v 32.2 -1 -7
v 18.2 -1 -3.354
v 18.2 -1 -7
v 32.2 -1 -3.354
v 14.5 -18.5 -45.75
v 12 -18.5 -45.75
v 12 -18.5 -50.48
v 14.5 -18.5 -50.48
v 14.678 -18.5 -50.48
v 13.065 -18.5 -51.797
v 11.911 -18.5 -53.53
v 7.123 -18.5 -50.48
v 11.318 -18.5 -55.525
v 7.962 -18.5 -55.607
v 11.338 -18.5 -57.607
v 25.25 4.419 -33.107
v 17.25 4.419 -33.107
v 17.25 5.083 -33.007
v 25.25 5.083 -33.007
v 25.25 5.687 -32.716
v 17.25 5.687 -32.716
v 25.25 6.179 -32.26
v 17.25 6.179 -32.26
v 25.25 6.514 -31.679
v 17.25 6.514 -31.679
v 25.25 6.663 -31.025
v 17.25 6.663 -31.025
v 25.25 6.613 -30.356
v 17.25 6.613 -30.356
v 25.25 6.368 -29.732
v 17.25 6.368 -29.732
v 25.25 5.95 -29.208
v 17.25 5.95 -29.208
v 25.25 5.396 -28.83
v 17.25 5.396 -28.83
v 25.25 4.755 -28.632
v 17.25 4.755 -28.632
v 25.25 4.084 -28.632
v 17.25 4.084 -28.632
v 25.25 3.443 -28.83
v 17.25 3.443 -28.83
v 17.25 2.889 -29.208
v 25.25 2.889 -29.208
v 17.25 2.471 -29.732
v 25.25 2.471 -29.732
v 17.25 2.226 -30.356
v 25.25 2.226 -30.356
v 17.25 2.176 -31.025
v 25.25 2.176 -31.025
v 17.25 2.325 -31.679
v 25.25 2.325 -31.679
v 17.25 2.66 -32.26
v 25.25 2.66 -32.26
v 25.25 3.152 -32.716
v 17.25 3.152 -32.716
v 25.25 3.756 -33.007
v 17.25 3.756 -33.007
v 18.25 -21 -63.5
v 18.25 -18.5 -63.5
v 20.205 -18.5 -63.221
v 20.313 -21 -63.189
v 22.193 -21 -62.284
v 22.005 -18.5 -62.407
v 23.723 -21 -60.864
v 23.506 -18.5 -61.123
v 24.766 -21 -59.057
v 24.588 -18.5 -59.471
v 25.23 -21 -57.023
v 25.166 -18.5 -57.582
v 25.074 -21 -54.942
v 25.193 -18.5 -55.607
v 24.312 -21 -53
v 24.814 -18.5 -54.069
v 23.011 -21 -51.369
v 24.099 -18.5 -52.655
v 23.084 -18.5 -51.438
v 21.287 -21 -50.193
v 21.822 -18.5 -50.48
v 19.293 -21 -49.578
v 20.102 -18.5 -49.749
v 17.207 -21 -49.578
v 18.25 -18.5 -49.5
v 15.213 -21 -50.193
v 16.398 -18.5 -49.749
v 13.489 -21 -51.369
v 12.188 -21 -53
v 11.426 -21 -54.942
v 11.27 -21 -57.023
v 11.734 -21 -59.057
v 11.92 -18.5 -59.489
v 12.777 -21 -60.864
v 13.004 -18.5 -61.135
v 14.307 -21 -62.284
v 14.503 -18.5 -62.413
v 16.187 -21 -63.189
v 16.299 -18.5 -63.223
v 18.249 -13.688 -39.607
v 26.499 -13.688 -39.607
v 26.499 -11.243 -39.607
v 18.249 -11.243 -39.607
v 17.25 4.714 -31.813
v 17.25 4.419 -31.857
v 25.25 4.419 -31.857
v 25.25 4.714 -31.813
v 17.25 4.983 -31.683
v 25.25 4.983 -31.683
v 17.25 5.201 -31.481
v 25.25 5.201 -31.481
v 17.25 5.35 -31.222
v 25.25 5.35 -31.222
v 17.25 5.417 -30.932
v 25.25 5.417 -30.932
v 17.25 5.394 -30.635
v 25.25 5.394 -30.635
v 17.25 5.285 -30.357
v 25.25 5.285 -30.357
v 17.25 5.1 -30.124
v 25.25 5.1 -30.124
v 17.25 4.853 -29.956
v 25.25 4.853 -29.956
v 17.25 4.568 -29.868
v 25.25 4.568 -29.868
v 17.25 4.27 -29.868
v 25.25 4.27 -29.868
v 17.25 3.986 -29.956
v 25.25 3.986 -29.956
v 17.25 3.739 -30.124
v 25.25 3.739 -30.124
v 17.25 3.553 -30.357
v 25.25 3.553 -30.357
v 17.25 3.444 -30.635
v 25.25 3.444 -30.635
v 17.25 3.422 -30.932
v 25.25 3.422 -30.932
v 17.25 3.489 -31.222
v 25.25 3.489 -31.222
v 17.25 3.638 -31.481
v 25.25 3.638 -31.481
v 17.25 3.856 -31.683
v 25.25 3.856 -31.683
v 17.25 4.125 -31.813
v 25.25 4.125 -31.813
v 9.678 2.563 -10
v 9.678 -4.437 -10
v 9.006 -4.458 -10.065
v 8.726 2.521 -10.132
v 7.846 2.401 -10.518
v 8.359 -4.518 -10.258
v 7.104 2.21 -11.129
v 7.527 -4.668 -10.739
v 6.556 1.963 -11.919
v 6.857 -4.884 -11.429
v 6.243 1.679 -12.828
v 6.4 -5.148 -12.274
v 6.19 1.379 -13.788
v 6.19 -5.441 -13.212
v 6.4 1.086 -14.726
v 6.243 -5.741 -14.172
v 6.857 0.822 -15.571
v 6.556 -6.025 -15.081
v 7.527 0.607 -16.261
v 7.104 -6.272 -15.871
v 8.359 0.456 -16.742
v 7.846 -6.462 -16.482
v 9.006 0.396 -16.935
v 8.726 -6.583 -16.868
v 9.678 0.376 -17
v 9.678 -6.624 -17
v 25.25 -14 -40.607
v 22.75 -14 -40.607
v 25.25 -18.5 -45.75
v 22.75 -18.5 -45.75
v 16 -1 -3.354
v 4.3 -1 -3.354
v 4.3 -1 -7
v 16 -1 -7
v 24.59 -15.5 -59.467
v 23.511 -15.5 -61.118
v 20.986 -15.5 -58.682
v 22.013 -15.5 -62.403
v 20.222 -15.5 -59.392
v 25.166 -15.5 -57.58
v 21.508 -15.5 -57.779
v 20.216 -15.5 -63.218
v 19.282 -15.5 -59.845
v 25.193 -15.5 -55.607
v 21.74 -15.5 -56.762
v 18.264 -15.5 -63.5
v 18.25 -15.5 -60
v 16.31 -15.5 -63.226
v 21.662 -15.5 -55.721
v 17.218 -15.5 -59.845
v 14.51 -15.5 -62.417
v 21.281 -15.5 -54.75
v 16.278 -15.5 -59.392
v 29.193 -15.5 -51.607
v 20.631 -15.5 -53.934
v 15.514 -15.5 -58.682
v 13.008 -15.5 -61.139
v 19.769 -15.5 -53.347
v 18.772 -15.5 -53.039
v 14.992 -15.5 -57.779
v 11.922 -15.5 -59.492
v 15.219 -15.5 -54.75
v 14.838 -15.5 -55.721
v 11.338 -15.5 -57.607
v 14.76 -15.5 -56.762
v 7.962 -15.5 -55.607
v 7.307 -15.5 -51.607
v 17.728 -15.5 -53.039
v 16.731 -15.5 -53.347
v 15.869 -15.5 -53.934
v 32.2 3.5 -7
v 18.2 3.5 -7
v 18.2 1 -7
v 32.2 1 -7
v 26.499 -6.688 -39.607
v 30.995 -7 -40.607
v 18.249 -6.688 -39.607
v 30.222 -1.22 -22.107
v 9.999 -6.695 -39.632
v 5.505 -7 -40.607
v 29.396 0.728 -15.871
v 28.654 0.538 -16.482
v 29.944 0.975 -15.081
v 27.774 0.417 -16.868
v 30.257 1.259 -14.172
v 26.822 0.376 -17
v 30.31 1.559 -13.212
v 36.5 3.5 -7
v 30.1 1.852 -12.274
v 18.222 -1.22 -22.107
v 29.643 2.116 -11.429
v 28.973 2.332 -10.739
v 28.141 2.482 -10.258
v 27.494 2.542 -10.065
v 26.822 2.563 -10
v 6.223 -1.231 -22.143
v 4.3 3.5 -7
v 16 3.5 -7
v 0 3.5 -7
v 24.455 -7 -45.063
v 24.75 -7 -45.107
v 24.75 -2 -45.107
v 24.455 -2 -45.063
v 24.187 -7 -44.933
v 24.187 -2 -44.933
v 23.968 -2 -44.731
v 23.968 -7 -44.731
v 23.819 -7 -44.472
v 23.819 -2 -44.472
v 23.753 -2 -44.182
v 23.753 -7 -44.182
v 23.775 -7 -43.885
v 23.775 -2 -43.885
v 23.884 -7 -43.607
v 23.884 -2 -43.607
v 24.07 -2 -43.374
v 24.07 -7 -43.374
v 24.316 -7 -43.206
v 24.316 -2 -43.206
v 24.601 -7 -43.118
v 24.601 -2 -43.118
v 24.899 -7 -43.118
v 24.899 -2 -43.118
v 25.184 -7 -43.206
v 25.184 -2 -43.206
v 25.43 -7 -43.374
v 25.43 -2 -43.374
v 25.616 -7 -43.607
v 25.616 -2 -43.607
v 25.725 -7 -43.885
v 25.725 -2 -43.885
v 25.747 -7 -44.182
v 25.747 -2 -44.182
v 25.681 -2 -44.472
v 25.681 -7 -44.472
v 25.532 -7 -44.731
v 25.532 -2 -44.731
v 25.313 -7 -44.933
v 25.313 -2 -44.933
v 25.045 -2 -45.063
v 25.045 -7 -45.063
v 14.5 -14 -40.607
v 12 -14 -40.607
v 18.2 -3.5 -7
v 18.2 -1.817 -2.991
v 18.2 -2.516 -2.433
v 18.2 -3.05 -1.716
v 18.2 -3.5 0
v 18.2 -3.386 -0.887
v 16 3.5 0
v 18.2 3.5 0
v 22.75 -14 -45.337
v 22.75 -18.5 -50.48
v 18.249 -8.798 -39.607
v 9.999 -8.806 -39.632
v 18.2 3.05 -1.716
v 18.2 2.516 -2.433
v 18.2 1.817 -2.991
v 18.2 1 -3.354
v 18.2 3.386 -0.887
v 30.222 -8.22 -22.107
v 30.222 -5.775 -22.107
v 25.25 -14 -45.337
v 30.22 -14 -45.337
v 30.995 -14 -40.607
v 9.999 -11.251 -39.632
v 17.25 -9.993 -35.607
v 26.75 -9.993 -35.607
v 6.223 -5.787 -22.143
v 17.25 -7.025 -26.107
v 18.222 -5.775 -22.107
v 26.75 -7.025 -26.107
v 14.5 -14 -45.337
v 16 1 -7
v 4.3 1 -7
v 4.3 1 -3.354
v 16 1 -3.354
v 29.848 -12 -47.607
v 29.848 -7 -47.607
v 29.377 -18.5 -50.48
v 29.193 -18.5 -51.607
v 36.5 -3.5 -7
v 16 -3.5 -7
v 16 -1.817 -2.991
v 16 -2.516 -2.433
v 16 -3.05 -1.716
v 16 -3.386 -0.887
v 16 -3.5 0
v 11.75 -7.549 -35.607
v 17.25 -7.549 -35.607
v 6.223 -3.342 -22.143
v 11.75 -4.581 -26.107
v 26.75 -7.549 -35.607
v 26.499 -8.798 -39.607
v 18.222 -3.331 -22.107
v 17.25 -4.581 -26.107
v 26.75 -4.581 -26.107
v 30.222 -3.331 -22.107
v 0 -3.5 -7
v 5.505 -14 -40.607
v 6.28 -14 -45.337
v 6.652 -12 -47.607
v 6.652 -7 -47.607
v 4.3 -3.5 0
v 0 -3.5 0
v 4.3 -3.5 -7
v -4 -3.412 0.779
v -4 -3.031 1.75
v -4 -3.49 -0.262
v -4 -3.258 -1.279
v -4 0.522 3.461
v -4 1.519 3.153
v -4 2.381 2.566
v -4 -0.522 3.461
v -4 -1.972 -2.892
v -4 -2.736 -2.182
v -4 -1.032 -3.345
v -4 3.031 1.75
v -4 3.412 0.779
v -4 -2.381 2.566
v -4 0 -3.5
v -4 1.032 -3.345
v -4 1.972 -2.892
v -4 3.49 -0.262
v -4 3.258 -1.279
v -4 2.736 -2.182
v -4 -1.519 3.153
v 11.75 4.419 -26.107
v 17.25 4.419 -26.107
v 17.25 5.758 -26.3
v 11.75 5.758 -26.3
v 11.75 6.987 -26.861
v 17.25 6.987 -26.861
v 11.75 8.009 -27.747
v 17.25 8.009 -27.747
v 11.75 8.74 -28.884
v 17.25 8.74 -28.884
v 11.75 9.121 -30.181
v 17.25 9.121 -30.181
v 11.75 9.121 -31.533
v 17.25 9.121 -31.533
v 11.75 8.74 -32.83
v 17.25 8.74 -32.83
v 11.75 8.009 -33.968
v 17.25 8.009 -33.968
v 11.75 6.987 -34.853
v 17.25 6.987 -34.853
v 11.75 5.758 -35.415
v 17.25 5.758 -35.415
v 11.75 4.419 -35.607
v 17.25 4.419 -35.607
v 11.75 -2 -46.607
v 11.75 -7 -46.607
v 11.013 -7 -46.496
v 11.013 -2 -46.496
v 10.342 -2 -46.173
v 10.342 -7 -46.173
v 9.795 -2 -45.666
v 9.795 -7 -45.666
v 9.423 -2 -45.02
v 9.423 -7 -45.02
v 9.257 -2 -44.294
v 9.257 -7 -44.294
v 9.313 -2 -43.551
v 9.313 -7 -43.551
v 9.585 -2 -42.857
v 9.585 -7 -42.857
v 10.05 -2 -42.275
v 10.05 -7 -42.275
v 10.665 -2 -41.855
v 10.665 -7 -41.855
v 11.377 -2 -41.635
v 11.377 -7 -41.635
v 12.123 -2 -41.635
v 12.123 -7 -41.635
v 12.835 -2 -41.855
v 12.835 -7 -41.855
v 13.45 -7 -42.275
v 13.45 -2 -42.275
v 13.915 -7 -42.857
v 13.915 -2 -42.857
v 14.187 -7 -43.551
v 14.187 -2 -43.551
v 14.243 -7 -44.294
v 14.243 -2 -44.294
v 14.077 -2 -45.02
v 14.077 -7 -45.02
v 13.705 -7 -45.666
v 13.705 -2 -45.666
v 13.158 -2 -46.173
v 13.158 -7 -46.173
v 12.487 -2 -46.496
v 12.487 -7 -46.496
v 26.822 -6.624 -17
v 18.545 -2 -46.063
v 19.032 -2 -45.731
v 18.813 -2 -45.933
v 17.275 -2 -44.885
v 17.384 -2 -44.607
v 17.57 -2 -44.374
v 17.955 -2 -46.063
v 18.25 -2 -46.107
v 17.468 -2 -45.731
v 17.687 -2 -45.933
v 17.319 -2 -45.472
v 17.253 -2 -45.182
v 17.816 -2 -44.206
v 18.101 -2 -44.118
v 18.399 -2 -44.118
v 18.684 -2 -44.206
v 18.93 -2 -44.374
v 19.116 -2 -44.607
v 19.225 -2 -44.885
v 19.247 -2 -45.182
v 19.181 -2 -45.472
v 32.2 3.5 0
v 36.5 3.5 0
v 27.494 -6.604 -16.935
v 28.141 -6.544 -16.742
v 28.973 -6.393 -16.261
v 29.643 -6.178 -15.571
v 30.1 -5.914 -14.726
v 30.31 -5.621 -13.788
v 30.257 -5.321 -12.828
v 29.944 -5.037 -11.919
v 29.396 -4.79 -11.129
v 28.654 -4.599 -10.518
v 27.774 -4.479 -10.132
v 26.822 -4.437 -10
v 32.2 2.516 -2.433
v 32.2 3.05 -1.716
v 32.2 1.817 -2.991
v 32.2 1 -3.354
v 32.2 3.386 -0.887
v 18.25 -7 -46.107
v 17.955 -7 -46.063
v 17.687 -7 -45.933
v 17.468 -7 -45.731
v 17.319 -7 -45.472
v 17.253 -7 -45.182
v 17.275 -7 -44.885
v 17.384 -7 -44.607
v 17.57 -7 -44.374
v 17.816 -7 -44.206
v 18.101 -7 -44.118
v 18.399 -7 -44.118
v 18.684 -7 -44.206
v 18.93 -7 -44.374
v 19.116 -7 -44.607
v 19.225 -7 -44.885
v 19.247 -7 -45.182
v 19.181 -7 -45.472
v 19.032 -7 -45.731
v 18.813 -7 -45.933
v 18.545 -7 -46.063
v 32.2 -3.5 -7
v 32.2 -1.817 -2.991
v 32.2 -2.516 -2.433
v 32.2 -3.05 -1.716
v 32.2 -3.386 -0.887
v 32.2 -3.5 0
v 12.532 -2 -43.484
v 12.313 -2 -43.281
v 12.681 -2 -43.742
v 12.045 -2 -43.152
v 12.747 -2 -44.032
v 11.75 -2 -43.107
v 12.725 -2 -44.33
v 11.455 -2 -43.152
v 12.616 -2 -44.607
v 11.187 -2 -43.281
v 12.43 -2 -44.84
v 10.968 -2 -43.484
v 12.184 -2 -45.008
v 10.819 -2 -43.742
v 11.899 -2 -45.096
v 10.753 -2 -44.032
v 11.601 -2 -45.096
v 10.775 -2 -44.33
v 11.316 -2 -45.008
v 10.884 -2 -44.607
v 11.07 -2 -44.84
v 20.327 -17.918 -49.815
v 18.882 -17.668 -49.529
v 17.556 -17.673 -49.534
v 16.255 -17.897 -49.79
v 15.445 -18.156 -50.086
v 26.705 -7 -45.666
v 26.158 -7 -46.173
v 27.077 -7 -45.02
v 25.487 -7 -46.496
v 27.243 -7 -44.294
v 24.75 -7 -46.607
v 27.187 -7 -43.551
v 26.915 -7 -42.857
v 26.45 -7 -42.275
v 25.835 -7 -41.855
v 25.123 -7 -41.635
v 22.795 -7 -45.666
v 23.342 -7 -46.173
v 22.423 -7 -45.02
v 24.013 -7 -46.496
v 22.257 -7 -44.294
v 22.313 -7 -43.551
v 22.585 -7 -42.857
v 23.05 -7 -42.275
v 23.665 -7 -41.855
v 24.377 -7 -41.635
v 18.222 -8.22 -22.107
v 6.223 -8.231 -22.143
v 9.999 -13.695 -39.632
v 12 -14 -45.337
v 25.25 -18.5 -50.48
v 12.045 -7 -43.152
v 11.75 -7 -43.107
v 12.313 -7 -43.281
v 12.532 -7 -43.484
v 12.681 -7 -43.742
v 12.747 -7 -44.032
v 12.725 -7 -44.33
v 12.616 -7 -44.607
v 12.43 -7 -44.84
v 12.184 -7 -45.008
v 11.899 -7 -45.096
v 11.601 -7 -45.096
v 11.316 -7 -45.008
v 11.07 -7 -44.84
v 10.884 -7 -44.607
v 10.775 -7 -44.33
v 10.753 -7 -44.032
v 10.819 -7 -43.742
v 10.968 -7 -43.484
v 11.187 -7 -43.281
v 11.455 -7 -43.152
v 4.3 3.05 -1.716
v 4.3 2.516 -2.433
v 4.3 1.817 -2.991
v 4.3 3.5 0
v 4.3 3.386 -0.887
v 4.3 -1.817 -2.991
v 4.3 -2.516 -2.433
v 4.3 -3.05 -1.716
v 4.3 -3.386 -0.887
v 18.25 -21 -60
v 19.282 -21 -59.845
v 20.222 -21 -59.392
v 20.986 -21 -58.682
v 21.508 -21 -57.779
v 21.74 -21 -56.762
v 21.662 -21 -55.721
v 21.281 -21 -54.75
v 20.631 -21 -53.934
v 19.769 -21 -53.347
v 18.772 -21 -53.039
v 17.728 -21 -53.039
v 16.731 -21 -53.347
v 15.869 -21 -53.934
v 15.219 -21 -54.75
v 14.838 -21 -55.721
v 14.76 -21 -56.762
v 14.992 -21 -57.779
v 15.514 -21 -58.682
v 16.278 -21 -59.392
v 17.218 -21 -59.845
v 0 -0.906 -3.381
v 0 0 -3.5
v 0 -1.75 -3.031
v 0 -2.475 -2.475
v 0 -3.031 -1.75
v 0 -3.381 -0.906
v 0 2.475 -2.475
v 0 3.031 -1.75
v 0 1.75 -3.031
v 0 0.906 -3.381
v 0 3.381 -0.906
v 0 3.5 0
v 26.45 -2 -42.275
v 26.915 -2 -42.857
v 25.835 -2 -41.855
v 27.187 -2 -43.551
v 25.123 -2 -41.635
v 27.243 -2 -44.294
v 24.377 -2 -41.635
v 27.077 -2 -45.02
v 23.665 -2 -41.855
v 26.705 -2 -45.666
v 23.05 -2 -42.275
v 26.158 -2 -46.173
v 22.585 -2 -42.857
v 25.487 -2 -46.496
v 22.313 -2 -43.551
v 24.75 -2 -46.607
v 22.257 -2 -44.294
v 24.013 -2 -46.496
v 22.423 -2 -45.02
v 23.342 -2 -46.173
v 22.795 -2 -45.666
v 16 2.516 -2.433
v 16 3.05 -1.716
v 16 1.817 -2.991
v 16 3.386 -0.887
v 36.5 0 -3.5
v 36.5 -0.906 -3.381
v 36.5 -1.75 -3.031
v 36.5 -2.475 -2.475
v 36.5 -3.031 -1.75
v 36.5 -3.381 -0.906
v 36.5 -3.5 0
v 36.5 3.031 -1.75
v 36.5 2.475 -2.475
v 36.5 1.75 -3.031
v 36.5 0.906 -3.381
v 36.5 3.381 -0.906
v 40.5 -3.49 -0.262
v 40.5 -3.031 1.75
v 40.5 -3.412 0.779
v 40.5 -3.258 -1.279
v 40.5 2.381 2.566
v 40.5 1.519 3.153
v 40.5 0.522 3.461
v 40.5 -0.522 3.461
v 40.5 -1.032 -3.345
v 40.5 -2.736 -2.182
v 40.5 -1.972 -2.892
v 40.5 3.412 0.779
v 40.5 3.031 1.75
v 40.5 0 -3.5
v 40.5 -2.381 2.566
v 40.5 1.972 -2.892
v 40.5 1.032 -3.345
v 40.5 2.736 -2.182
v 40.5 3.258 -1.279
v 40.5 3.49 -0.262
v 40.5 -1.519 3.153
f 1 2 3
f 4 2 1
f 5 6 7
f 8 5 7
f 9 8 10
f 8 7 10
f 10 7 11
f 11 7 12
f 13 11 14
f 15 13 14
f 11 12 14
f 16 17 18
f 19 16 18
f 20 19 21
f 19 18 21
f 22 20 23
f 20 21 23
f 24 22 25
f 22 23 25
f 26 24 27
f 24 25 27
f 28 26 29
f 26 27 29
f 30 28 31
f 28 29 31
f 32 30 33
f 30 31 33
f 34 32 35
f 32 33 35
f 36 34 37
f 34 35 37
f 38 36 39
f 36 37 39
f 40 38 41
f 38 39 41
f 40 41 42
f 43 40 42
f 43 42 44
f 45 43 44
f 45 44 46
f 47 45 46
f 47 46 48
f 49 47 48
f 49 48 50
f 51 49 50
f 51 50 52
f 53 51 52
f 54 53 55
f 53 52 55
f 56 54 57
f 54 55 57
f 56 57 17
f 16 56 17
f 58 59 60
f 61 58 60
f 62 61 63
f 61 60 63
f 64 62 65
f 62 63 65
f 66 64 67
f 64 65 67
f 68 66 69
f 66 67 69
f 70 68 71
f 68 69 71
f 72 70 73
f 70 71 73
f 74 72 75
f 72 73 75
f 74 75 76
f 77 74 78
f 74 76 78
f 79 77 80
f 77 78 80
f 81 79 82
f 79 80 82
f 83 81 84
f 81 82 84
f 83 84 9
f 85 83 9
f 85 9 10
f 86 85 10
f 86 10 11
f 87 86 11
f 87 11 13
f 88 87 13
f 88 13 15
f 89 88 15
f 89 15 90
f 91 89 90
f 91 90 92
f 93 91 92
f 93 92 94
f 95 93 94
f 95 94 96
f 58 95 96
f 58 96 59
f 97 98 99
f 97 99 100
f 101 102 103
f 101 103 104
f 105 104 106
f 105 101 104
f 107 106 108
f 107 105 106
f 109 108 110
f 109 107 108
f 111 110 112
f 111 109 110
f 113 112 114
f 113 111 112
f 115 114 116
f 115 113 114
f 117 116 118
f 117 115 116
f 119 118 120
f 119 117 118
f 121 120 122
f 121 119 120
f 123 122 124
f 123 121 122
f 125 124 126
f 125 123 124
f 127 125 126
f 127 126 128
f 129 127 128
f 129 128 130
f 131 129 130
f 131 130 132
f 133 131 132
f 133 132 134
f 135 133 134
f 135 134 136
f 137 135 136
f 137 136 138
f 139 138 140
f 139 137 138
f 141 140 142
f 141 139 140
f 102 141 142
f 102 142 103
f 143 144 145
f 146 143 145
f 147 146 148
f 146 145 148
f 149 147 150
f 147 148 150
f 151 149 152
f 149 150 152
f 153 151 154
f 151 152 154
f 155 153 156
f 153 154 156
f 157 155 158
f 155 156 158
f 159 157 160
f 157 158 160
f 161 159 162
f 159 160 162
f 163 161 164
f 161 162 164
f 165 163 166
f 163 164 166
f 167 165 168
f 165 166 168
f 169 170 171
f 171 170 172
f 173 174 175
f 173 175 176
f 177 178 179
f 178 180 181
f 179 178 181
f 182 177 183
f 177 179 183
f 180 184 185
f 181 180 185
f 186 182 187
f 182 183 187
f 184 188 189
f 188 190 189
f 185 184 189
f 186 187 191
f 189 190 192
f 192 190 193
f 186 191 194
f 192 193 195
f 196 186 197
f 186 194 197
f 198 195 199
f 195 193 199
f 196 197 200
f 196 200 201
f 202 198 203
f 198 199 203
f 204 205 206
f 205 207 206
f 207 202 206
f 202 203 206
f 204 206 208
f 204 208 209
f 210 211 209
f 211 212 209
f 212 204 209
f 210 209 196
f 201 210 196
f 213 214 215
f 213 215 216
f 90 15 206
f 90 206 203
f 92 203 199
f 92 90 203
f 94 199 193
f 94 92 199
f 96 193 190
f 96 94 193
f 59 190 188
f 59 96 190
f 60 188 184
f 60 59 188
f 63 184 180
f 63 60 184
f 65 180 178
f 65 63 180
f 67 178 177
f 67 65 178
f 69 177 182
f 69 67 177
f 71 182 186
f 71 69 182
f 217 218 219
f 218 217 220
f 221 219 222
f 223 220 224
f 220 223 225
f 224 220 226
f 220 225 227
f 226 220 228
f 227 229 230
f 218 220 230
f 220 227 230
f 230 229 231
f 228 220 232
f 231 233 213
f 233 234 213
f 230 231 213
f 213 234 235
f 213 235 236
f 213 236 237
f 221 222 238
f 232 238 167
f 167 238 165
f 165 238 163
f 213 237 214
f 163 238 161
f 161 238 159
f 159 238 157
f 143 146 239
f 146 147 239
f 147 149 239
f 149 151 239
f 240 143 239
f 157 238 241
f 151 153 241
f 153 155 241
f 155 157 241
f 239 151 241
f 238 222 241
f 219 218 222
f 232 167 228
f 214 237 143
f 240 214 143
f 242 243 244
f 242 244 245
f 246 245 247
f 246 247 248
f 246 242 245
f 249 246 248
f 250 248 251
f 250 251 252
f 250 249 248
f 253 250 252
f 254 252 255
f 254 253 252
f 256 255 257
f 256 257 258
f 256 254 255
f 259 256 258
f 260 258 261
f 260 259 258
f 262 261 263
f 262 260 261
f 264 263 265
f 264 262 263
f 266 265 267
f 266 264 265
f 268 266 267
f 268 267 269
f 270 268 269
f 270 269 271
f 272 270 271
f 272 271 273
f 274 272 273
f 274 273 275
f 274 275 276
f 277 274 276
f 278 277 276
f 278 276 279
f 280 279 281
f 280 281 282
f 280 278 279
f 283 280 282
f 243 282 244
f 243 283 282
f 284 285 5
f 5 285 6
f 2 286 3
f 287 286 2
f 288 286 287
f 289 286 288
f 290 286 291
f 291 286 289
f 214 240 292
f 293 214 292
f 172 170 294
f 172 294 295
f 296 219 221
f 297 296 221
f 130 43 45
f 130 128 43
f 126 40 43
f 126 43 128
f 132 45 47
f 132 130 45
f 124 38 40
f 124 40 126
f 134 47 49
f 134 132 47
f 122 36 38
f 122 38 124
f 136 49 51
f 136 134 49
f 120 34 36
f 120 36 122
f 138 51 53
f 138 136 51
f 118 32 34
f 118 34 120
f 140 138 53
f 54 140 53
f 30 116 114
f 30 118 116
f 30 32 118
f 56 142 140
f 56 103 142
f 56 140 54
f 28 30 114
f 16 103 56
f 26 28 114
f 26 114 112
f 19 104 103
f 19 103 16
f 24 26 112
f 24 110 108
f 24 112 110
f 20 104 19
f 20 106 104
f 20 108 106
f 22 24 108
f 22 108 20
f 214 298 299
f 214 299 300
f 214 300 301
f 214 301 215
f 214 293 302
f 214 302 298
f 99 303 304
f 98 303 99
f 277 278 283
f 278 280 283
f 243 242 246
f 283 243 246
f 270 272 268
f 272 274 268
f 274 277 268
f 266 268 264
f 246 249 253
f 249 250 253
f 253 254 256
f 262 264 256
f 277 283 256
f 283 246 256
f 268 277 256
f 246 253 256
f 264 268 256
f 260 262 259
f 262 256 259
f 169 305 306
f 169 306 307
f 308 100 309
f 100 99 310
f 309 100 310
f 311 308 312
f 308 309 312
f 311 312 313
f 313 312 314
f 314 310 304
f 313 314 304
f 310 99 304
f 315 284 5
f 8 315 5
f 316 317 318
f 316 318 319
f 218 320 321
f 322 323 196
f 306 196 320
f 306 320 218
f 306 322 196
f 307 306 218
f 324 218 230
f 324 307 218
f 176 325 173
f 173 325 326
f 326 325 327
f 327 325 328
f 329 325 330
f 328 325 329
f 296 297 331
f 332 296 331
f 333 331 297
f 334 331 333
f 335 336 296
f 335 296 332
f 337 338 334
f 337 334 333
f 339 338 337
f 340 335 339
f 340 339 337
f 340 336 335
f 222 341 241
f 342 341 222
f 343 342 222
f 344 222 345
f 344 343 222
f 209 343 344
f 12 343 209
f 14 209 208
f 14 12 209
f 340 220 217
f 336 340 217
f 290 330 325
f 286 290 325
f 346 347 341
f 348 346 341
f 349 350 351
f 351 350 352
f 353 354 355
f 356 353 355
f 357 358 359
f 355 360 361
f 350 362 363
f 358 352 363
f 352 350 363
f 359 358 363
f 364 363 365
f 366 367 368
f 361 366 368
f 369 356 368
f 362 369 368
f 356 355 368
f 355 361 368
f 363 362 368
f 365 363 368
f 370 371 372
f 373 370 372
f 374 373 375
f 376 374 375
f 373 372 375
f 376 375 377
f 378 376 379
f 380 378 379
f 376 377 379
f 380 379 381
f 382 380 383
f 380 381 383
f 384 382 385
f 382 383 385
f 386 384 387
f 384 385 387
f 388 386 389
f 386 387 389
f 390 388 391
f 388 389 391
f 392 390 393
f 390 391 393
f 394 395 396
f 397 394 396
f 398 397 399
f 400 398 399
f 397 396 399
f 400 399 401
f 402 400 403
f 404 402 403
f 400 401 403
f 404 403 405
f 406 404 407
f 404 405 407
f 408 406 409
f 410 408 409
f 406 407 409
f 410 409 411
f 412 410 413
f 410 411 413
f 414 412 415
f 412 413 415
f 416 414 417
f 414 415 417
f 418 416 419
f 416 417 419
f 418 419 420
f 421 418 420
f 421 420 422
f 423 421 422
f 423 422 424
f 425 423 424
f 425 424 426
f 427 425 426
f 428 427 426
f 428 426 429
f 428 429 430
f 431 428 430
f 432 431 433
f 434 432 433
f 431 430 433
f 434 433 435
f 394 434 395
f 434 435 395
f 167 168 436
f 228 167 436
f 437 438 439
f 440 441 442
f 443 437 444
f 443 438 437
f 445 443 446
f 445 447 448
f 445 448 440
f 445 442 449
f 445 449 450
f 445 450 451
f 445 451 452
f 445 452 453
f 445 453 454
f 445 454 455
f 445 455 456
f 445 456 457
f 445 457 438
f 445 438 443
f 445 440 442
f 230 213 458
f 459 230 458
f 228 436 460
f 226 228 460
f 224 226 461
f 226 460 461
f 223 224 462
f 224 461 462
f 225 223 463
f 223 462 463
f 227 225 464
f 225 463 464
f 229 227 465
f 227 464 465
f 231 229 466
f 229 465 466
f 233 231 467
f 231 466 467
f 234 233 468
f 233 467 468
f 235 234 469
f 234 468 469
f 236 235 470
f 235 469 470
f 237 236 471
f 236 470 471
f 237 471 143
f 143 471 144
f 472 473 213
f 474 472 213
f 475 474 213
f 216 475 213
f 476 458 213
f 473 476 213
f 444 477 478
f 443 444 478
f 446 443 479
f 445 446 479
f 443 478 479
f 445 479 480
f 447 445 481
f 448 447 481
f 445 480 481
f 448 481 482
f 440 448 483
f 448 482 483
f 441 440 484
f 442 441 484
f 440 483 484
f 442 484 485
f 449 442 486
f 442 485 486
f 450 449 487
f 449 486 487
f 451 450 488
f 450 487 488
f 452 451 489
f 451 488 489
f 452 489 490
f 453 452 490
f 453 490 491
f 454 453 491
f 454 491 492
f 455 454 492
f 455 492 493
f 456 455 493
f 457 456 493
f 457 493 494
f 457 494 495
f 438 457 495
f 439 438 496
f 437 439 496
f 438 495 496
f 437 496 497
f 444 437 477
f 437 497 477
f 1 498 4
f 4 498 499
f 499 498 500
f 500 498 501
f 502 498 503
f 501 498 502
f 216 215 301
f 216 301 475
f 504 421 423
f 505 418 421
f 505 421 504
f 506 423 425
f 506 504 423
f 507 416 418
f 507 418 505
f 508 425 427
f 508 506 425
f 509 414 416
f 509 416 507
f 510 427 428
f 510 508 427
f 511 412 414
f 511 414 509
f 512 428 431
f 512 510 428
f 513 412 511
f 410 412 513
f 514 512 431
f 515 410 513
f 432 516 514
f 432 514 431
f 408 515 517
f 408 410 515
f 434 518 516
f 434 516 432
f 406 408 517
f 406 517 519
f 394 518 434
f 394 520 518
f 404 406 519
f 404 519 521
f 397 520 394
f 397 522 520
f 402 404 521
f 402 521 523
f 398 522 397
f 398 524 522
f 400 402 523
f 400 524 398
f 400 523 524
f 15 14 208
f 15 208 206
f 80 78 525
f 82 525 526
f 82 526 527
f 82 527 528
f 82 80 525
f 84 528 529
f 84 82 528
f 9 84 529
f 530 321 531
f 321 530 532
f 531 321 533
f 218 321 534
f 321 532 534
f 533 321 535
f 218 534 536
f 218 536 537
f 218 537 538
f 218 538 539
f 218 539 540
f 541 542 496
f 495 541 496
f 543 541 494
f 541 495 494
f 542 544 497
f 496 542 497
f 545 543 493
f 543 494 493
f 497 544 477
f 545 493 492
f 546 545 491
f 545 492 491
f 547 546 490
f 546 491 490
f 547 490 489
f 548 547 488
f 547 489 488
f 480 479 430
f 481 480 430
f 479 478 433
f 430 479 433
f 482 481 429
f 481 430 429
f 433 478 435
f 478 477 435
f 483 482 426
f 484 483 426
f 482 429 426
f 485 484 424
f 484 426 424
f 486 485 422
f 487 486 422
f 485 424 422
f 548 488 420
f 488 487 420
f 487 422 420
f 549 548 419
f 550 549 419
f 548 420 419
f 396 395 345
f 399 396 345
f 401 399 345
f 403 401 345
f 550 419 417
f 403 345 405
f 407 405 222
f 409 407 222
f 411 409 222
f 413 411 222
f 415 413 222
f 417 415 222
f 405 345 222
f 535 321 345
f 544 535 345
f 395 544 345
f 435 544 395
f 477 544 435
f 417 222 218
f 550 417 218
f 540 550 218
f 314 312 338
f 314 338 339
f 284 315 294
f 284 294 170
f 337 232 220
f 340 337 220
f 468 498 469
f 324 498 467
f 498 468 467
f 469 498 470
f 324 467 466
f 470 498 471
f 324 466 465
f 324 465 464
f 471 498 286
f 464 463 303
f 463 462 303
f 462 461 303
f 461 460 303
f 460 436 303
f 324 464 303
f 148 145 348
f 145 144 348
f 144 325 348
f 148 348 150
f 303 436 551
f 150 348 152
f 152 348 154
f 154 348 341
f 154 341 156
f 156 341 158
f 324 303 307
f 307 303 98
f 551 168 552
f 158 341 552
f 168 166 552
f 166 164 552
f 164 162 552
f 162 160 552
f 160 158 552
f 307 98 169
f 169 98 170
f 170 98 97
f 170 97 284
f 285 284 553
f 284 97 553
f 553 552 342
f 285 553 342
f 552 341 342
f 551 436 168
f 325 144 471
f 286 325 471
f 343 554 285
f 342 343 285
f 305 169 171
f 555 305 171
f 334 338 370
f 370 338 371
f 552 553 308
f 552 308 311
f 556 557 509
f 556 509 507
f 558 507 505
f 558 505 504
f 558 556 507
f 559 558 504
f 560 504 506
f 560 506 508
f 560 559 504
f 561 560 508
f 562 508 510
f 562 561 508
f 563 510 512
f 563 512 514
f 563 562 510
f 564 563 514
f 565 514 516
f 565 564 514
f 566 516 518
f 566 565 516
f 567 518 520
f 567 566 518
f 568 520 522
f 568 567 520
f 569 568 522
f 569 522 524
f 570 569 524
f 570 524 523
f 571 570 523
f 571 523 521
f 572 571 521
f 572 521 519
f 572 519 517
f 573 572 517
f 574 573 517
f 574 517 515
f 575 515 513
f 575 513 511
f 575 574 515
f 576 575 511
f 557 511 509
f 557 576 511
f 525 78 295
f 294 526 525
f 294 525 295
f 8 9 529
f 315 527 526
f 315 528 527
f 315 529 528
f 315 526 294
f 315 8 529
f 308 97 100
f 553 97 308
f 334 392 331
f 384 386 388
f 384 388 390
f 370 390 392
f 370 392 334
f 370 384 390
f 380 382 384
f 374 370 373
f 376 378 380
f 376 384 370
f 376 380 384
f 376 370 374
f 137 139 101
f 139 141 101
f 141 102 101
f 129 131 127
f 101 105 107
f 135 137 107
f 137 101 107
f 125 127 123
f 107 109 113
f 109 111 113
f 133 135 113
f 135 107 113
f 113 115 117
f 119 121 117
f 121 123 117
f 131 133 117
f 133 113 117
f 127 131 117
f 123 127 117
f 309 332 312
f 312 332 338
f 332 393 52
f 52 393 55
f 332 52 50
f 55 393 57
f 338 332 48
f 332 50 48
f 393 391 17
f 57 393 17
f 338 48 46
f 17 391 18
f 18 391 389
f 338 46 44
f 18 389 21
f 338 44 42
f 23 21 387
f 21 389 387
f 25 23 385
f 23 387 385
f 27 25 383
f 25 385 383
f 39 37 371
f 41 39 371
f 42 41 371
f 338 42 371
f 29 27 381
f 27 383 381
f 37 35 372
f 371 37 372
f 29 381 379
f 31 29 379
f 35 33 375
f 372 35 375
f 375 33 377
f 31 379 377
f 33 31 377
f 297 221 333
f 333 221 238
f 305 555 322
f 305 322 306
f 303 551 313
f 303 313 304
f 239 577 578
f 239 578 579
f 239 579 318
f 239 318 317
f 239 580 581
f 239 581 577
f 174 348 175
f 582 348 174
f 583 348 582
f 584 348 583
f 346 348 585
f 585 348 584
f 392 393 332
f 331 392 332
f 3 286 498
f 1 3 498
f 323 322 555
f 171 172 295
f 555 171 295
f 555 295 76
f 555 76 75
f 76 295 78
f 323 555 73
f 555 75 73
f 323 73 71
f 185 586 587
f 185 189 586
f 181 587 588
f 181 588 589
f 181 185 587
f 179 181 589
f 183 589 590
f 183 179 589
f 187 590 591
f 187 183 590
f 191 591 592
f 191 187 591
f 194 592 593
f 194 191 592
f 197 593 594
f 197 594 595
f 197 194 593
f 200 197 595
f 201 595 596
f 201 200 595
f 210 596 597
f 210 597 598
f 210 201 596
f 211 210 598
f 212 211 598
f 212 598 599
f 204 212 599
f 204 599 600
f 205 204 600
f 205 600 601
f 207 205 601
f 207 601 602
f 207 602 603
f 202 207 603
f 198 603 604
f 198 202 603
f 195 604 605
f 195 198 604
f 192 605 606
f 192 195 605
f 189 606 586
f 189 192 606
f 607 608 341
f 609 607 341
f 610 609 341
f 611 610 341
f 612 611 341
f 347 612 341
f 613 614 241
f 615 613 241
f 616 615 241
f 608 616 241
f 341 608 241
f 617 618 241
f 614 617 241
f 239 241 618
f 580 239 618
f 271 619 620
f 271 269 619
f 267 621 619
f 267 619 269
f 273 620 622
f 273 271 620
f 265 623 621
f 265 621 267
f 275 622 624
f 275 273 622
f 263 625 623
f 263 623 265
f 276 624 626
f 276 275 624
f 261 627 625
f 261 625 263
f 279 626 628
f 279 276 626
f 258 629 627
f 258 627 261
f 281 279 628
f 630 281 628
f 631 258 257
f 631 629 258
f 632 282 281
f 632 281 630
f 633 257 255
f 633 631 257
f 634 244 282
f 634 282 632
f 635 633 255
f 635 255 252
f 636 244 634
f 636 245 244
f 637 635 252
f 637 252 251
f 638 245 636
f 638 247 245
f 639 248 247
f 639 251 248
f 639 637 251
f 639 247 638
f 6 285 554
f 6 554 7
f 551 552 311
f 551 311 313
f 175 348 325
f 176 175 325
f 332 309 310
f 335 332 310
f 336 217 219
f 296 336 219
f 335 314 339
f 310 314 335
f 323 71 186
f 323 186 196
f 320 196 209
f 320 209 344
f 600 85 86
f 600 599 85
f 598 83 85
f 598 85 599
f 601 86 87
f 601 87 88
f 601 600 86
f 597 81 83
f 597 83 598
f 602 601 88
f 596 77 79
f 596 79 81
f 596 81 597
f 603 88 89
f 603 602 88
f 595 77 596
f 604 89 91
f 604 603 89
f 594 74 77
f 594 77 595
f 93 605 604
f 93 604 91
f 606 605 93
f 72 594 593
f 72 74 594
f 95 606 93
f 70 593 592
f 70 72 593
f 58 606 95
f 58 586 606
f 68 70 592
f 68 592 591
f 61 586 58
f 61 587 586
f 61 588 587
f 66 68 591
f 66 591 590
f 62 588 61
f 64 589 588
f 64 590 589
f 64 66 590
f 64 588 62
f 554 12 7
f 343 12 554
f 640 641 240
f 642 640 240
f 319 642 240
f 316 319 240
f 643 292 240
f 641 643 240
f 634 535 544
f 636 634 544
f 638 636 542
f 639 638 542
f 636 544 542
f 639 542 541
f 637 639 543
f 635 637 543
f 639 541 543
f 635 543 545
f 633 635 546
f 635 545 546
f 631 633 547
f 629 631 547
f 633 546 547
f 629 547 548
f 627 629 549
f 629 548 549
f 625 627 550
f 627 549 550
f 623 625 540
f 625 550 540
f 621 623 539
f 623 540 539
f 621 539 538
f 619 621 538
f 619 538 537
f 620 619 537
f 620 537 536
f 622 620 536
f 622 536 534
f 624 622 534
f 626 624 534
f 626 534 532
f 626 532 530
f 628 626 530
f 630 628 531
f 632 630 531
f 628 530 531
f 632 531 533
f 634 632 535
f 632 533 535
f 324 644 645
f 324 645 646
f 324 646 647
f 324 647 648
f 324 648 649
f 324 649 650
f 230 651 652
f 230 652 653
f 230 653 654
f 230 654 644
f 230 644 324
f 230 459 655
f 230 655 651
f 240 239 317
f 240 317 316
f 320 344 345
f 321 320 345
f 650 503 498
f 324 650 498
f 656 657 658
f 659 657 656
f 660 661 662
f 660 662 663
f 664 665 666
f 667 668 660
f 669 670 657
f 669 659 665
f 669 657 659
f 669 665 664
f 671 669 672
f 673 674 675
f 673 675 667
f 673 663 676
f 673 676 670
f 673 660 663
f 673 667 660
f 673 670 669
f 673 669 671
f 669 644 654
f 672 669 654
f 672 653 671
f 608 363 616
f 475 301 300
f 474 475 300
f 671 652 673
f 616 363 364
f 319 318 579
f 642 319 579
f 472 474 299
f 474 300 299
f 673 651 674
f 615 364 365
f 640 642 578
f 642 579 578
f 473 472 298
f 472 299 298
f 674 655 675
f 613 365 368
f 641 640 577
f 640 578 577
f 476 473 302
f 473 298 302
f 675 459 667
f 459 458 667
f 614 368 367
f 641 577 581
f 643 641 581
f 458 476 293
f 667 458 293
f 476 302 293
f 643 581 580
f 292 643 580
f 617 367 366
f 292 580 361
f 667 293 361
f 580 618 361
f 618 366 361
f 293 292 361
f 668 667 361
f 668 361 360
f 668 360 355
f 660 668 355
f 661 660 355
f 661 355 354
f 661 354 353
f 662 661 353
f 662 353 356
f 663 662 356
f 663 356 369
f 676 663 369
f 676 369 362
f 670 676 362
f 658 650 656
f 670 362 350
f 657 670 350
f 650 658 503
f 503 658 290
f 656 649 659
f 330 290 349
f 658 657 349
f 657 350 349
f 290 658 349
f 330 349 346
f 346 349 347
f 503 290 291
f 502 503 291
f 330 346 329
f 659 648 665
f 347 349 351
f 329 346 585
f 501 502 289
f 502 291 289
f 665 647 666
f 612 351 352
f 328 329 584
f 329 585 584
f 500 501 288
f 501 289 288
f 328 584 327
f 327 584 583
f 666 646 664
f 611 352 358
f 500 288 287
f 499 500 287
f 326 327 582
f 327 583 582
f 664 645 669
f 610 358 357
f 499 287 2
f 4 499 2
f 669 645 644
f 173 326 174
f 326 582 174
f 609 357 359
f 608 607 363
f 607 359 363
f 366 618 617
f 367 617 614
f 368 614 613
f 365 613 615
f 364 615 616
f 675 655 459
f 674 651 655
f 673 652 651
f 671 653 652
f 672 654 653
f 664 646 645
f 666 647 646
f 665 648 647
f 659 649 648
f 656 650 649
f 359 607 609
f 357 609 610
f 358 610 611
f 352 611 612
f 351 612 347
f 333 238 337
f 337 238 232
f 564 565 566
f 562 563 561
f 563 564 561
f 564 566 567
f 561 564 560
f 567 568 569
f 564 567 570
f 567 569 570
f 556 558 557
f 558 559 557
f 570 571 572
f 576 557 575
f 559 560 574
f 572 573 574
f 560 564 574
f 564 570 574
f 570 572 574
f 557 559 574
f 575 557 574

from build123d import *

# Parameters (mm, degrees)
BOSS_EXTRUDE1_DEPTH             = 36.5
CUT_EXTRUDE1_DEPTH              = 76.543034093
CUT_EXTRUDE1_DEPTH_BACK         = 36.5
SKETCH2_R                       = 3.5
SKETCH2_W                       = 9.5
SKETCH2_H                       = 9.5
SKETCH5_W                       = 11.7
SKETCH5_H                       = 7
SKETCH5_W_2                     = 14
CUT_EXTRUDE2_DEPTH              = 2.5
SKETCH6_W                       = 14
SKETCH6_H                       = 7
SKETCH6_W_2                     = 11.7
CUT_EXTRUDE3_DEPTH              = 2.5
BOSS_EXTRUDE2_DEPTH             = 4
BOSS_EXTRUDE2_DEPTH_BACK        = 40.5
SKETCH3_R                       = 3.5
CUT_EXTRUDE4_REACH              = 79.555
CUT_EXTRUDE5_REACH              = 80.463
BOSS_EXTRUDE3_DEPTH             = 5.5
SKETCH10_R                      = 2.25
SKETCH10_R_2                    = 1
BOSS_EXTRUDE4_DEPTH             = 8
SKETCH11_R                      = 2.5
SKETCH11_R_2                    = 1
BOSS_EXTRUDE5_DEPTH             = 5
CUT_EXTRUDE7_DEPTH              = 12
CUT_EXTRUDE8_START              = 14.5
CUT_EXTRUDE8_DEPTH              = 8.25
CUT_EXTRUDE9_START              = 25.25
CUT_EXTRUDE9_DEPTH              = 8
SKETCH14_R                      = 7
SKETCH14_R_2                    = 3.5
BOSS_EXTRUDE6_DEPTH             = 2.5
BOSS_EXTRUDE6_DIRECTION_2_REACH = 82.238


with BuildPart() as part:
    # Sketch1 → Boss-Extrude1 (new body)
    with BuildSketch(Plane(origin=(0, 0, 0), x_dir=(0, 0, -1), z_dir=(1, 0, 0))):
        with BuildLine():
            Line((7, -3.5), (40.607142857, -14))
            Line((40.607142857, -14), (45.75, -18.5))
            Line((45.75, -18.5), (49.75, -18.5))
            Line((49.75, -18.5), (63.5, -18.5))
            Line((63.5, -18.5), (63.5, -15.5))
            Line((63.5, -15.5), (51.607142857, -15.5))
            Line((51.607142857, -15.5), (47.607142857, -12))
            Line((47.607142857, -12), (47.607142857, -7))
            Line((47.607142857, -7), (40.607142857, -7))
            Line((40.607142857, -7), (7, 3.5))
            Line((7, 3.5), (0, 3.5))
            ThreePointArc((0, 3.5), (-3.5, 0), (0, -3.5))
            Line((0, -3.5), (7, -3.5))
        make_face()
    extrude(amount=BOSS_EXTRUDE1_DEPTH)

    # Sketch2 → Cut-Extrude1 (cut, two sides: drawn at the far end of the back side and taken through both)
    with BuildSketch(Plane(origin=(0, 0, 0), x_dir=(1, 0, 0), z_dir=(0, 1, 0)).offset(-CUT_EXTRUDE1_DEPTH_BACK)):
        with Locations(Location((18.25, 56.5, 0), (0, 0, 90))):
            Circle(SKETCH2_R)
        with BuildLine():
            Line((25.192824074, 55.607142857), (29.192824074, 51.607142857))
            Line((29.192824074, 51.607142857), (36.5, 7))
            Line((36.5, 7), (46.5, 7))
            Line((46.5, 7), (46.5, 73.5))
            Line((46.5, 73.5), (-10, 73.5))
            Line((-10, 73.5), (-10, 7))
            Line((-10, 7), (0, 7))
            Line((0, 7), (7.962423087, 55.607142857))
            Line((7.962423087, 55.607142857), (11.338109181, 57.607142857))
            ThreePointArc((11.338109181, 57.607142857), (19.250119601, 63.428185966), (25.192824074, 55.607142857))
        make_face()
        with BuildLine():
            Line((9.678067434, 17), (26.821932566, 17))
            ThreePointArc((26.821932566, 17), (30.321932566, 13.5), (26.821932566, 10))
            Line((26.821932566, 10), (9.678067434, 10))
            ThreePointArc((9.678067434, 10), (6.178067434, 13.5), (9.678067434, 17))
        make_face()
        with Locations((22, 30.857142857)):
            Rectangle(SKETCH2_W, SKETCH2_H)
    extrude(amount=CUT_EXTRUDE1_DEPTH + CUT_EXTRUDE1_DEPTH_BACK, mode=Mode.SUBTRACT)

    # Sketch5 → Cut-Extrude2 (cut)
    with BuildSketch(Plane(origin=(0, 3.5, 0), x_dir=(1, 0, 0), z_dir=(0, 1, 0))):
        with Locations((10.15, 3.5)):
            Rectangle(SKETCH5_W, SKETCH5_H)
        with Locations((25.2, 3.5)):
            Rectangle(SKETCH5_W_2, SKETCH5_H)
    extrude(amount=-CUT_EXTRUDE2_DEPTH, mode=Mode.SUBTRACT)

    # Sketch6 → Cut-Extrude3 (cut)
    with BuildSketch(Plane.XZ.offset(3.5)):
        with Locations((25.2, -3.5)):
            Rectangle(SKETCH6_W, SKETCH6_H)
        with Locations((10.15, -3.5)):
            Rectangle(SKETCH6_W_2, SKETCH6_H)
    extrude(amount=-CUT_EXTRUDE3_DEPTH, mode=Mode.SUBTRACT)

    # Sketch3 → Boss-Extrude2 (add, two sides: drawn at the far end of the back side and taken through both)
    with BuildSketch(Plane(origin=(36.5, 0, 0), x_dir=(0, 0, -1), z_dir=(1, 0, 0)).offset(-BOSS_EXTRUDE2_DEPTH_BACK)):
        Circle(SKETCH3_R)
    extrude(amount=BOSS_EXTRUDE2_DEPTH + BOSS_EXTRUDE2_DEPTH_BACK)

    # Cut-Extrude4: up to this plane
    cut_extrude4_end = Plane(origin=(36.5, 0.954324111, -8.391680434), z_dir=(0, 0.9544980251192885, -0.2982172363284494))
    # Sketch7 → Cut-Extrude4 (cut, up to the surface)
    with BuildSketch(Plane(origin=(0, 0, 0), x_dir=(1, 0, 0), z_dir=(0, 1, 0)), mode=Mode.PRIVATE) as cut_extrude4_sk1:
        Polygon((18.222476089, 22.107142857), (30.222476089, 22.107142857), (26.498512221, 39.607142857), (18.248512221, 39.607142857), (9.998548743, 39.631691156), (6.222529213, 22.142849473), align=None)
    cut_extrude4_tool1 = split(extrude(cut_extrude4_sk1.sketch, amount=-CUT_EXTRUDE4_REACH, mode=Mode.PRIVATE), bisect_by=cut_extrude4_end, keep=Keep.BOTH, mode=Mode.PRIVATE)
    add(cut_extrude4_tool1.solids().sort_by_distance((18.234702, 0, -30.324637))[0], mode=Mode.SUBTRACT)

    # Cut-Extrude5: up to this plane
    cut_extrude5_end = Plane(origin=(36.5, -1.272837948, -7.695840216), z_dir=(0, 0.9544980251192885, -0.2982172363284494))
    # Sketch8 → Cut-Extrude5 (cut, up to the surface)
    with BuildSketch(Plane(origin=(0, -18.5, 0), x_dir=(1, 0, 0), z_dir=(0, 1, 0)), mode=Mode.PRIVATE) as cut_extrude5_sk1:
        Polygon((18.222476089, 22.107142857), (30.222476089, 22.107142857), (26.498512221, 39.607142857), (18.248512221, 39.607142857), (9.998548743, 39.631691156), (6.222529213, 22.142849473), align=None)
    cut_extrude5_tool1 = split(extrude(cut_extrude5_sk1.sketch, amount=CUT_EXTRUDE5_REACH, mode=Mode.PRIVATE), bisect_by=cut_extrude5_end, keep=Keep.BOTH, mode=Mode.PRIVATE)
    add(cut_extrude5_tool1.solids().sort_by_distance((18.234702, -18.5, -30.324637))[0], mode=Mode.SUBTRACT)

    # Sketch9 → Boss-Extrude3 (add)
    with BuildSketch(Plane(origin=(17.25, 0, 0), x_dir=(0, 0, -1), z_dir=(1, 0, 0))):
        with BuildLine():
            Line((26.107142857, -4.580581258), (26.107142857, 4.419418742))
            ThreePointArc((26.107142857, 4.419418742), (30.857142857, 9.169418742), (35.607142857, 4.419418742))
            Line((35.607142857, 4.419418742), (35.607142857, -7.548700281))
            Line((35.607142857, -7.548700281), (26.107142857, -4.580581258))
        make_face()
    extrude(amount=-BOSS_EXTRUDE3_DEPTH)

    # Sketch10 → Boss-Extrude4 (add)
    with BuildSketch(Plane(origin=(17.25, 0, 0), x_dir=(0, 0, -1), z_dir=(1, 0, 0))):
        with Locations((30.857142857, 4.419418742)):
            Circle(SKETCH10_R)
        with Locations((30.857142857, 4.419418742)):
            Circle(SKETCH10_R_2, mode=Mode.SUBTRACT)
    extrude(amount=BOSS_EXTRUDE4_DEPTH)

    # Sketch11 → Boss-Extrude5 (add)
    # profile 1 of 3: a face of its own
    with BuildSketch(Plane(origin=(0, -7, 0), x_dir=(1, 0, 0), z_dir=(0, 1, 0))):
        with Locations(Location((11.75, 44.107142857, 0), (0, 0, 90))):
            Circle(SKETCH11_R)
        with Locations(Location((11.75, 44.107142857, 0), (0, 0, 270))):
            Circle(SKETCH11_R_2, mode=Mode.SUBTRACT)
    # profile 2 of 3: a face of its own
    with BuildSketch(Plane(origin=(0, -7, 0), x_dir=(1, 0, 0), z_dir=(0, 1, 0))):
        with Locations(Location((18.25, 45.107142857, 0), (0, 0, 90))):
            Circle(SKETCH11_R_2)
    # profile 3 of 3: a face of its own
    with BuildSketch(Plane(origin=(0, -7, 0), x_dir=(1, 0, 0), z_dir=(0, 1, 0))):
        with Locations(Location((24.75, 44.107142857, 0), (0, 0, 90))):
            Circle(SKETCH11_R)
        with Locations(Location((24.75, 44.107142857, 0), (0, 0, 90))):
            Circle(SKETCH11_R_2, mode=Mode.SUBTRACT)
    extrude(amount=BOSS_EXTRUDE5_DEPTH)

    # Sketch13 → Cut-Extrude7 (cut)
    with BuildSketch(Plane(origin=(0, 0, 0), x_dir=(0, 0, -1), z_dir=(1, 0, 0))):
        Polygon((53.908508937, -21.5), (45.337080366, -14), (40.607142857, -14), (40.607142857, -21.5), align=None)
    extrude(amount=CUT_EXTRUDE7_DEPTH, mode=Mode.SUBTRACT)

    # Sketch13<3> → Cut-Extrude8 (cut)
    with BuildSketch(Plane(origin=(0, 0, 0), x_dir=(0, 0, -1), z_dir=(1, 0, 0)).offset(CUT_EXTRUDE8_START)):
        Polygon((53.908508937, -21.5), (45.337080366, -14), (40.607142857, -14), (40.607142857, -21.5), align=None)
    extrude(amount=CUT_EXTRUDE8_DEPTH, mode=Mode.SUBTRACT)

    # Sketch13<4> → Cut-Extrude9 (cut)
    with BuildSketch(Plane(origin=(0, 0, 0), x_dir=(0, 0, -1), z_dir=(1, 0, 0)).offset(CUT_EXTRUDE9_START)):
        Polygon((53.908508937, -21.5), (45.337080366, -14), (40.607142857, -14), (40.607142857, -21.5), align=None)
    extrude(amount=CUT_EXTRUDE9_DEPTH, mode=Mode.SUBTRACT)

    # Sketch14 → Boss-Extrude6 (add)
    with BuildSketch(Plane.XZ.offset(18.5)):
        with Locations(Location((18.25, -56.5, 0), (0, 0, 270))):
            Circle(SKETCH14_R)
        with Locations(Location((18.25, -56.5, 0), (0, 0, 270))):
            Circle(SKETCH14_R_2, mode=Mode.SUBTRACT)
    extrude(amount=BOSS_EXTRUDE6_DEPTH)

    # Boss-Extrude6 direction 2: up to this face of the body (flat: up to its plane)
    boss_extrude6_direction_2_end = Plane(part.part.faces().sort_by_distance((27.530853261, -16.180546647, -47.829133677))[0])
    # Sketch14 → Boss-Extrude6 direction 2 (add, up to the picked face)
    with BuildSketch(Plane.XZ.offset(18.5), mode=Mode.PRIVATE) as boss_extrude6_direction_2_sk1:
        with Locations(Location((18.25, -56.5, 0), (0, 0, 270))):
            Circle(SKETCH14_R)
        with Locations(Location((18.25, -56.5, 0), (0, 0, 270))):
            Circle(SKETCH14_R_2, mode=Mode.SUBTRACT)
    boss_extrude6_direction_2_tool1 = split(extrude(boss_extrude6_direction_2_sk1.sketch, amount=-BOSS_EXTRUDE6_DIRECTION_2_REACH, mode=Mode.PRIVATE), bisect_by=boss_extrude6_direction_2_end, keep=Keep.BOTH, mode=Mode.PRIVATE)
    add(boss_extrude6_direction_2_tool1.solids().sort_by(Axis((18.25, -18.5, -49.69799), (0, 1, 0)))[0])


solid = part.part
